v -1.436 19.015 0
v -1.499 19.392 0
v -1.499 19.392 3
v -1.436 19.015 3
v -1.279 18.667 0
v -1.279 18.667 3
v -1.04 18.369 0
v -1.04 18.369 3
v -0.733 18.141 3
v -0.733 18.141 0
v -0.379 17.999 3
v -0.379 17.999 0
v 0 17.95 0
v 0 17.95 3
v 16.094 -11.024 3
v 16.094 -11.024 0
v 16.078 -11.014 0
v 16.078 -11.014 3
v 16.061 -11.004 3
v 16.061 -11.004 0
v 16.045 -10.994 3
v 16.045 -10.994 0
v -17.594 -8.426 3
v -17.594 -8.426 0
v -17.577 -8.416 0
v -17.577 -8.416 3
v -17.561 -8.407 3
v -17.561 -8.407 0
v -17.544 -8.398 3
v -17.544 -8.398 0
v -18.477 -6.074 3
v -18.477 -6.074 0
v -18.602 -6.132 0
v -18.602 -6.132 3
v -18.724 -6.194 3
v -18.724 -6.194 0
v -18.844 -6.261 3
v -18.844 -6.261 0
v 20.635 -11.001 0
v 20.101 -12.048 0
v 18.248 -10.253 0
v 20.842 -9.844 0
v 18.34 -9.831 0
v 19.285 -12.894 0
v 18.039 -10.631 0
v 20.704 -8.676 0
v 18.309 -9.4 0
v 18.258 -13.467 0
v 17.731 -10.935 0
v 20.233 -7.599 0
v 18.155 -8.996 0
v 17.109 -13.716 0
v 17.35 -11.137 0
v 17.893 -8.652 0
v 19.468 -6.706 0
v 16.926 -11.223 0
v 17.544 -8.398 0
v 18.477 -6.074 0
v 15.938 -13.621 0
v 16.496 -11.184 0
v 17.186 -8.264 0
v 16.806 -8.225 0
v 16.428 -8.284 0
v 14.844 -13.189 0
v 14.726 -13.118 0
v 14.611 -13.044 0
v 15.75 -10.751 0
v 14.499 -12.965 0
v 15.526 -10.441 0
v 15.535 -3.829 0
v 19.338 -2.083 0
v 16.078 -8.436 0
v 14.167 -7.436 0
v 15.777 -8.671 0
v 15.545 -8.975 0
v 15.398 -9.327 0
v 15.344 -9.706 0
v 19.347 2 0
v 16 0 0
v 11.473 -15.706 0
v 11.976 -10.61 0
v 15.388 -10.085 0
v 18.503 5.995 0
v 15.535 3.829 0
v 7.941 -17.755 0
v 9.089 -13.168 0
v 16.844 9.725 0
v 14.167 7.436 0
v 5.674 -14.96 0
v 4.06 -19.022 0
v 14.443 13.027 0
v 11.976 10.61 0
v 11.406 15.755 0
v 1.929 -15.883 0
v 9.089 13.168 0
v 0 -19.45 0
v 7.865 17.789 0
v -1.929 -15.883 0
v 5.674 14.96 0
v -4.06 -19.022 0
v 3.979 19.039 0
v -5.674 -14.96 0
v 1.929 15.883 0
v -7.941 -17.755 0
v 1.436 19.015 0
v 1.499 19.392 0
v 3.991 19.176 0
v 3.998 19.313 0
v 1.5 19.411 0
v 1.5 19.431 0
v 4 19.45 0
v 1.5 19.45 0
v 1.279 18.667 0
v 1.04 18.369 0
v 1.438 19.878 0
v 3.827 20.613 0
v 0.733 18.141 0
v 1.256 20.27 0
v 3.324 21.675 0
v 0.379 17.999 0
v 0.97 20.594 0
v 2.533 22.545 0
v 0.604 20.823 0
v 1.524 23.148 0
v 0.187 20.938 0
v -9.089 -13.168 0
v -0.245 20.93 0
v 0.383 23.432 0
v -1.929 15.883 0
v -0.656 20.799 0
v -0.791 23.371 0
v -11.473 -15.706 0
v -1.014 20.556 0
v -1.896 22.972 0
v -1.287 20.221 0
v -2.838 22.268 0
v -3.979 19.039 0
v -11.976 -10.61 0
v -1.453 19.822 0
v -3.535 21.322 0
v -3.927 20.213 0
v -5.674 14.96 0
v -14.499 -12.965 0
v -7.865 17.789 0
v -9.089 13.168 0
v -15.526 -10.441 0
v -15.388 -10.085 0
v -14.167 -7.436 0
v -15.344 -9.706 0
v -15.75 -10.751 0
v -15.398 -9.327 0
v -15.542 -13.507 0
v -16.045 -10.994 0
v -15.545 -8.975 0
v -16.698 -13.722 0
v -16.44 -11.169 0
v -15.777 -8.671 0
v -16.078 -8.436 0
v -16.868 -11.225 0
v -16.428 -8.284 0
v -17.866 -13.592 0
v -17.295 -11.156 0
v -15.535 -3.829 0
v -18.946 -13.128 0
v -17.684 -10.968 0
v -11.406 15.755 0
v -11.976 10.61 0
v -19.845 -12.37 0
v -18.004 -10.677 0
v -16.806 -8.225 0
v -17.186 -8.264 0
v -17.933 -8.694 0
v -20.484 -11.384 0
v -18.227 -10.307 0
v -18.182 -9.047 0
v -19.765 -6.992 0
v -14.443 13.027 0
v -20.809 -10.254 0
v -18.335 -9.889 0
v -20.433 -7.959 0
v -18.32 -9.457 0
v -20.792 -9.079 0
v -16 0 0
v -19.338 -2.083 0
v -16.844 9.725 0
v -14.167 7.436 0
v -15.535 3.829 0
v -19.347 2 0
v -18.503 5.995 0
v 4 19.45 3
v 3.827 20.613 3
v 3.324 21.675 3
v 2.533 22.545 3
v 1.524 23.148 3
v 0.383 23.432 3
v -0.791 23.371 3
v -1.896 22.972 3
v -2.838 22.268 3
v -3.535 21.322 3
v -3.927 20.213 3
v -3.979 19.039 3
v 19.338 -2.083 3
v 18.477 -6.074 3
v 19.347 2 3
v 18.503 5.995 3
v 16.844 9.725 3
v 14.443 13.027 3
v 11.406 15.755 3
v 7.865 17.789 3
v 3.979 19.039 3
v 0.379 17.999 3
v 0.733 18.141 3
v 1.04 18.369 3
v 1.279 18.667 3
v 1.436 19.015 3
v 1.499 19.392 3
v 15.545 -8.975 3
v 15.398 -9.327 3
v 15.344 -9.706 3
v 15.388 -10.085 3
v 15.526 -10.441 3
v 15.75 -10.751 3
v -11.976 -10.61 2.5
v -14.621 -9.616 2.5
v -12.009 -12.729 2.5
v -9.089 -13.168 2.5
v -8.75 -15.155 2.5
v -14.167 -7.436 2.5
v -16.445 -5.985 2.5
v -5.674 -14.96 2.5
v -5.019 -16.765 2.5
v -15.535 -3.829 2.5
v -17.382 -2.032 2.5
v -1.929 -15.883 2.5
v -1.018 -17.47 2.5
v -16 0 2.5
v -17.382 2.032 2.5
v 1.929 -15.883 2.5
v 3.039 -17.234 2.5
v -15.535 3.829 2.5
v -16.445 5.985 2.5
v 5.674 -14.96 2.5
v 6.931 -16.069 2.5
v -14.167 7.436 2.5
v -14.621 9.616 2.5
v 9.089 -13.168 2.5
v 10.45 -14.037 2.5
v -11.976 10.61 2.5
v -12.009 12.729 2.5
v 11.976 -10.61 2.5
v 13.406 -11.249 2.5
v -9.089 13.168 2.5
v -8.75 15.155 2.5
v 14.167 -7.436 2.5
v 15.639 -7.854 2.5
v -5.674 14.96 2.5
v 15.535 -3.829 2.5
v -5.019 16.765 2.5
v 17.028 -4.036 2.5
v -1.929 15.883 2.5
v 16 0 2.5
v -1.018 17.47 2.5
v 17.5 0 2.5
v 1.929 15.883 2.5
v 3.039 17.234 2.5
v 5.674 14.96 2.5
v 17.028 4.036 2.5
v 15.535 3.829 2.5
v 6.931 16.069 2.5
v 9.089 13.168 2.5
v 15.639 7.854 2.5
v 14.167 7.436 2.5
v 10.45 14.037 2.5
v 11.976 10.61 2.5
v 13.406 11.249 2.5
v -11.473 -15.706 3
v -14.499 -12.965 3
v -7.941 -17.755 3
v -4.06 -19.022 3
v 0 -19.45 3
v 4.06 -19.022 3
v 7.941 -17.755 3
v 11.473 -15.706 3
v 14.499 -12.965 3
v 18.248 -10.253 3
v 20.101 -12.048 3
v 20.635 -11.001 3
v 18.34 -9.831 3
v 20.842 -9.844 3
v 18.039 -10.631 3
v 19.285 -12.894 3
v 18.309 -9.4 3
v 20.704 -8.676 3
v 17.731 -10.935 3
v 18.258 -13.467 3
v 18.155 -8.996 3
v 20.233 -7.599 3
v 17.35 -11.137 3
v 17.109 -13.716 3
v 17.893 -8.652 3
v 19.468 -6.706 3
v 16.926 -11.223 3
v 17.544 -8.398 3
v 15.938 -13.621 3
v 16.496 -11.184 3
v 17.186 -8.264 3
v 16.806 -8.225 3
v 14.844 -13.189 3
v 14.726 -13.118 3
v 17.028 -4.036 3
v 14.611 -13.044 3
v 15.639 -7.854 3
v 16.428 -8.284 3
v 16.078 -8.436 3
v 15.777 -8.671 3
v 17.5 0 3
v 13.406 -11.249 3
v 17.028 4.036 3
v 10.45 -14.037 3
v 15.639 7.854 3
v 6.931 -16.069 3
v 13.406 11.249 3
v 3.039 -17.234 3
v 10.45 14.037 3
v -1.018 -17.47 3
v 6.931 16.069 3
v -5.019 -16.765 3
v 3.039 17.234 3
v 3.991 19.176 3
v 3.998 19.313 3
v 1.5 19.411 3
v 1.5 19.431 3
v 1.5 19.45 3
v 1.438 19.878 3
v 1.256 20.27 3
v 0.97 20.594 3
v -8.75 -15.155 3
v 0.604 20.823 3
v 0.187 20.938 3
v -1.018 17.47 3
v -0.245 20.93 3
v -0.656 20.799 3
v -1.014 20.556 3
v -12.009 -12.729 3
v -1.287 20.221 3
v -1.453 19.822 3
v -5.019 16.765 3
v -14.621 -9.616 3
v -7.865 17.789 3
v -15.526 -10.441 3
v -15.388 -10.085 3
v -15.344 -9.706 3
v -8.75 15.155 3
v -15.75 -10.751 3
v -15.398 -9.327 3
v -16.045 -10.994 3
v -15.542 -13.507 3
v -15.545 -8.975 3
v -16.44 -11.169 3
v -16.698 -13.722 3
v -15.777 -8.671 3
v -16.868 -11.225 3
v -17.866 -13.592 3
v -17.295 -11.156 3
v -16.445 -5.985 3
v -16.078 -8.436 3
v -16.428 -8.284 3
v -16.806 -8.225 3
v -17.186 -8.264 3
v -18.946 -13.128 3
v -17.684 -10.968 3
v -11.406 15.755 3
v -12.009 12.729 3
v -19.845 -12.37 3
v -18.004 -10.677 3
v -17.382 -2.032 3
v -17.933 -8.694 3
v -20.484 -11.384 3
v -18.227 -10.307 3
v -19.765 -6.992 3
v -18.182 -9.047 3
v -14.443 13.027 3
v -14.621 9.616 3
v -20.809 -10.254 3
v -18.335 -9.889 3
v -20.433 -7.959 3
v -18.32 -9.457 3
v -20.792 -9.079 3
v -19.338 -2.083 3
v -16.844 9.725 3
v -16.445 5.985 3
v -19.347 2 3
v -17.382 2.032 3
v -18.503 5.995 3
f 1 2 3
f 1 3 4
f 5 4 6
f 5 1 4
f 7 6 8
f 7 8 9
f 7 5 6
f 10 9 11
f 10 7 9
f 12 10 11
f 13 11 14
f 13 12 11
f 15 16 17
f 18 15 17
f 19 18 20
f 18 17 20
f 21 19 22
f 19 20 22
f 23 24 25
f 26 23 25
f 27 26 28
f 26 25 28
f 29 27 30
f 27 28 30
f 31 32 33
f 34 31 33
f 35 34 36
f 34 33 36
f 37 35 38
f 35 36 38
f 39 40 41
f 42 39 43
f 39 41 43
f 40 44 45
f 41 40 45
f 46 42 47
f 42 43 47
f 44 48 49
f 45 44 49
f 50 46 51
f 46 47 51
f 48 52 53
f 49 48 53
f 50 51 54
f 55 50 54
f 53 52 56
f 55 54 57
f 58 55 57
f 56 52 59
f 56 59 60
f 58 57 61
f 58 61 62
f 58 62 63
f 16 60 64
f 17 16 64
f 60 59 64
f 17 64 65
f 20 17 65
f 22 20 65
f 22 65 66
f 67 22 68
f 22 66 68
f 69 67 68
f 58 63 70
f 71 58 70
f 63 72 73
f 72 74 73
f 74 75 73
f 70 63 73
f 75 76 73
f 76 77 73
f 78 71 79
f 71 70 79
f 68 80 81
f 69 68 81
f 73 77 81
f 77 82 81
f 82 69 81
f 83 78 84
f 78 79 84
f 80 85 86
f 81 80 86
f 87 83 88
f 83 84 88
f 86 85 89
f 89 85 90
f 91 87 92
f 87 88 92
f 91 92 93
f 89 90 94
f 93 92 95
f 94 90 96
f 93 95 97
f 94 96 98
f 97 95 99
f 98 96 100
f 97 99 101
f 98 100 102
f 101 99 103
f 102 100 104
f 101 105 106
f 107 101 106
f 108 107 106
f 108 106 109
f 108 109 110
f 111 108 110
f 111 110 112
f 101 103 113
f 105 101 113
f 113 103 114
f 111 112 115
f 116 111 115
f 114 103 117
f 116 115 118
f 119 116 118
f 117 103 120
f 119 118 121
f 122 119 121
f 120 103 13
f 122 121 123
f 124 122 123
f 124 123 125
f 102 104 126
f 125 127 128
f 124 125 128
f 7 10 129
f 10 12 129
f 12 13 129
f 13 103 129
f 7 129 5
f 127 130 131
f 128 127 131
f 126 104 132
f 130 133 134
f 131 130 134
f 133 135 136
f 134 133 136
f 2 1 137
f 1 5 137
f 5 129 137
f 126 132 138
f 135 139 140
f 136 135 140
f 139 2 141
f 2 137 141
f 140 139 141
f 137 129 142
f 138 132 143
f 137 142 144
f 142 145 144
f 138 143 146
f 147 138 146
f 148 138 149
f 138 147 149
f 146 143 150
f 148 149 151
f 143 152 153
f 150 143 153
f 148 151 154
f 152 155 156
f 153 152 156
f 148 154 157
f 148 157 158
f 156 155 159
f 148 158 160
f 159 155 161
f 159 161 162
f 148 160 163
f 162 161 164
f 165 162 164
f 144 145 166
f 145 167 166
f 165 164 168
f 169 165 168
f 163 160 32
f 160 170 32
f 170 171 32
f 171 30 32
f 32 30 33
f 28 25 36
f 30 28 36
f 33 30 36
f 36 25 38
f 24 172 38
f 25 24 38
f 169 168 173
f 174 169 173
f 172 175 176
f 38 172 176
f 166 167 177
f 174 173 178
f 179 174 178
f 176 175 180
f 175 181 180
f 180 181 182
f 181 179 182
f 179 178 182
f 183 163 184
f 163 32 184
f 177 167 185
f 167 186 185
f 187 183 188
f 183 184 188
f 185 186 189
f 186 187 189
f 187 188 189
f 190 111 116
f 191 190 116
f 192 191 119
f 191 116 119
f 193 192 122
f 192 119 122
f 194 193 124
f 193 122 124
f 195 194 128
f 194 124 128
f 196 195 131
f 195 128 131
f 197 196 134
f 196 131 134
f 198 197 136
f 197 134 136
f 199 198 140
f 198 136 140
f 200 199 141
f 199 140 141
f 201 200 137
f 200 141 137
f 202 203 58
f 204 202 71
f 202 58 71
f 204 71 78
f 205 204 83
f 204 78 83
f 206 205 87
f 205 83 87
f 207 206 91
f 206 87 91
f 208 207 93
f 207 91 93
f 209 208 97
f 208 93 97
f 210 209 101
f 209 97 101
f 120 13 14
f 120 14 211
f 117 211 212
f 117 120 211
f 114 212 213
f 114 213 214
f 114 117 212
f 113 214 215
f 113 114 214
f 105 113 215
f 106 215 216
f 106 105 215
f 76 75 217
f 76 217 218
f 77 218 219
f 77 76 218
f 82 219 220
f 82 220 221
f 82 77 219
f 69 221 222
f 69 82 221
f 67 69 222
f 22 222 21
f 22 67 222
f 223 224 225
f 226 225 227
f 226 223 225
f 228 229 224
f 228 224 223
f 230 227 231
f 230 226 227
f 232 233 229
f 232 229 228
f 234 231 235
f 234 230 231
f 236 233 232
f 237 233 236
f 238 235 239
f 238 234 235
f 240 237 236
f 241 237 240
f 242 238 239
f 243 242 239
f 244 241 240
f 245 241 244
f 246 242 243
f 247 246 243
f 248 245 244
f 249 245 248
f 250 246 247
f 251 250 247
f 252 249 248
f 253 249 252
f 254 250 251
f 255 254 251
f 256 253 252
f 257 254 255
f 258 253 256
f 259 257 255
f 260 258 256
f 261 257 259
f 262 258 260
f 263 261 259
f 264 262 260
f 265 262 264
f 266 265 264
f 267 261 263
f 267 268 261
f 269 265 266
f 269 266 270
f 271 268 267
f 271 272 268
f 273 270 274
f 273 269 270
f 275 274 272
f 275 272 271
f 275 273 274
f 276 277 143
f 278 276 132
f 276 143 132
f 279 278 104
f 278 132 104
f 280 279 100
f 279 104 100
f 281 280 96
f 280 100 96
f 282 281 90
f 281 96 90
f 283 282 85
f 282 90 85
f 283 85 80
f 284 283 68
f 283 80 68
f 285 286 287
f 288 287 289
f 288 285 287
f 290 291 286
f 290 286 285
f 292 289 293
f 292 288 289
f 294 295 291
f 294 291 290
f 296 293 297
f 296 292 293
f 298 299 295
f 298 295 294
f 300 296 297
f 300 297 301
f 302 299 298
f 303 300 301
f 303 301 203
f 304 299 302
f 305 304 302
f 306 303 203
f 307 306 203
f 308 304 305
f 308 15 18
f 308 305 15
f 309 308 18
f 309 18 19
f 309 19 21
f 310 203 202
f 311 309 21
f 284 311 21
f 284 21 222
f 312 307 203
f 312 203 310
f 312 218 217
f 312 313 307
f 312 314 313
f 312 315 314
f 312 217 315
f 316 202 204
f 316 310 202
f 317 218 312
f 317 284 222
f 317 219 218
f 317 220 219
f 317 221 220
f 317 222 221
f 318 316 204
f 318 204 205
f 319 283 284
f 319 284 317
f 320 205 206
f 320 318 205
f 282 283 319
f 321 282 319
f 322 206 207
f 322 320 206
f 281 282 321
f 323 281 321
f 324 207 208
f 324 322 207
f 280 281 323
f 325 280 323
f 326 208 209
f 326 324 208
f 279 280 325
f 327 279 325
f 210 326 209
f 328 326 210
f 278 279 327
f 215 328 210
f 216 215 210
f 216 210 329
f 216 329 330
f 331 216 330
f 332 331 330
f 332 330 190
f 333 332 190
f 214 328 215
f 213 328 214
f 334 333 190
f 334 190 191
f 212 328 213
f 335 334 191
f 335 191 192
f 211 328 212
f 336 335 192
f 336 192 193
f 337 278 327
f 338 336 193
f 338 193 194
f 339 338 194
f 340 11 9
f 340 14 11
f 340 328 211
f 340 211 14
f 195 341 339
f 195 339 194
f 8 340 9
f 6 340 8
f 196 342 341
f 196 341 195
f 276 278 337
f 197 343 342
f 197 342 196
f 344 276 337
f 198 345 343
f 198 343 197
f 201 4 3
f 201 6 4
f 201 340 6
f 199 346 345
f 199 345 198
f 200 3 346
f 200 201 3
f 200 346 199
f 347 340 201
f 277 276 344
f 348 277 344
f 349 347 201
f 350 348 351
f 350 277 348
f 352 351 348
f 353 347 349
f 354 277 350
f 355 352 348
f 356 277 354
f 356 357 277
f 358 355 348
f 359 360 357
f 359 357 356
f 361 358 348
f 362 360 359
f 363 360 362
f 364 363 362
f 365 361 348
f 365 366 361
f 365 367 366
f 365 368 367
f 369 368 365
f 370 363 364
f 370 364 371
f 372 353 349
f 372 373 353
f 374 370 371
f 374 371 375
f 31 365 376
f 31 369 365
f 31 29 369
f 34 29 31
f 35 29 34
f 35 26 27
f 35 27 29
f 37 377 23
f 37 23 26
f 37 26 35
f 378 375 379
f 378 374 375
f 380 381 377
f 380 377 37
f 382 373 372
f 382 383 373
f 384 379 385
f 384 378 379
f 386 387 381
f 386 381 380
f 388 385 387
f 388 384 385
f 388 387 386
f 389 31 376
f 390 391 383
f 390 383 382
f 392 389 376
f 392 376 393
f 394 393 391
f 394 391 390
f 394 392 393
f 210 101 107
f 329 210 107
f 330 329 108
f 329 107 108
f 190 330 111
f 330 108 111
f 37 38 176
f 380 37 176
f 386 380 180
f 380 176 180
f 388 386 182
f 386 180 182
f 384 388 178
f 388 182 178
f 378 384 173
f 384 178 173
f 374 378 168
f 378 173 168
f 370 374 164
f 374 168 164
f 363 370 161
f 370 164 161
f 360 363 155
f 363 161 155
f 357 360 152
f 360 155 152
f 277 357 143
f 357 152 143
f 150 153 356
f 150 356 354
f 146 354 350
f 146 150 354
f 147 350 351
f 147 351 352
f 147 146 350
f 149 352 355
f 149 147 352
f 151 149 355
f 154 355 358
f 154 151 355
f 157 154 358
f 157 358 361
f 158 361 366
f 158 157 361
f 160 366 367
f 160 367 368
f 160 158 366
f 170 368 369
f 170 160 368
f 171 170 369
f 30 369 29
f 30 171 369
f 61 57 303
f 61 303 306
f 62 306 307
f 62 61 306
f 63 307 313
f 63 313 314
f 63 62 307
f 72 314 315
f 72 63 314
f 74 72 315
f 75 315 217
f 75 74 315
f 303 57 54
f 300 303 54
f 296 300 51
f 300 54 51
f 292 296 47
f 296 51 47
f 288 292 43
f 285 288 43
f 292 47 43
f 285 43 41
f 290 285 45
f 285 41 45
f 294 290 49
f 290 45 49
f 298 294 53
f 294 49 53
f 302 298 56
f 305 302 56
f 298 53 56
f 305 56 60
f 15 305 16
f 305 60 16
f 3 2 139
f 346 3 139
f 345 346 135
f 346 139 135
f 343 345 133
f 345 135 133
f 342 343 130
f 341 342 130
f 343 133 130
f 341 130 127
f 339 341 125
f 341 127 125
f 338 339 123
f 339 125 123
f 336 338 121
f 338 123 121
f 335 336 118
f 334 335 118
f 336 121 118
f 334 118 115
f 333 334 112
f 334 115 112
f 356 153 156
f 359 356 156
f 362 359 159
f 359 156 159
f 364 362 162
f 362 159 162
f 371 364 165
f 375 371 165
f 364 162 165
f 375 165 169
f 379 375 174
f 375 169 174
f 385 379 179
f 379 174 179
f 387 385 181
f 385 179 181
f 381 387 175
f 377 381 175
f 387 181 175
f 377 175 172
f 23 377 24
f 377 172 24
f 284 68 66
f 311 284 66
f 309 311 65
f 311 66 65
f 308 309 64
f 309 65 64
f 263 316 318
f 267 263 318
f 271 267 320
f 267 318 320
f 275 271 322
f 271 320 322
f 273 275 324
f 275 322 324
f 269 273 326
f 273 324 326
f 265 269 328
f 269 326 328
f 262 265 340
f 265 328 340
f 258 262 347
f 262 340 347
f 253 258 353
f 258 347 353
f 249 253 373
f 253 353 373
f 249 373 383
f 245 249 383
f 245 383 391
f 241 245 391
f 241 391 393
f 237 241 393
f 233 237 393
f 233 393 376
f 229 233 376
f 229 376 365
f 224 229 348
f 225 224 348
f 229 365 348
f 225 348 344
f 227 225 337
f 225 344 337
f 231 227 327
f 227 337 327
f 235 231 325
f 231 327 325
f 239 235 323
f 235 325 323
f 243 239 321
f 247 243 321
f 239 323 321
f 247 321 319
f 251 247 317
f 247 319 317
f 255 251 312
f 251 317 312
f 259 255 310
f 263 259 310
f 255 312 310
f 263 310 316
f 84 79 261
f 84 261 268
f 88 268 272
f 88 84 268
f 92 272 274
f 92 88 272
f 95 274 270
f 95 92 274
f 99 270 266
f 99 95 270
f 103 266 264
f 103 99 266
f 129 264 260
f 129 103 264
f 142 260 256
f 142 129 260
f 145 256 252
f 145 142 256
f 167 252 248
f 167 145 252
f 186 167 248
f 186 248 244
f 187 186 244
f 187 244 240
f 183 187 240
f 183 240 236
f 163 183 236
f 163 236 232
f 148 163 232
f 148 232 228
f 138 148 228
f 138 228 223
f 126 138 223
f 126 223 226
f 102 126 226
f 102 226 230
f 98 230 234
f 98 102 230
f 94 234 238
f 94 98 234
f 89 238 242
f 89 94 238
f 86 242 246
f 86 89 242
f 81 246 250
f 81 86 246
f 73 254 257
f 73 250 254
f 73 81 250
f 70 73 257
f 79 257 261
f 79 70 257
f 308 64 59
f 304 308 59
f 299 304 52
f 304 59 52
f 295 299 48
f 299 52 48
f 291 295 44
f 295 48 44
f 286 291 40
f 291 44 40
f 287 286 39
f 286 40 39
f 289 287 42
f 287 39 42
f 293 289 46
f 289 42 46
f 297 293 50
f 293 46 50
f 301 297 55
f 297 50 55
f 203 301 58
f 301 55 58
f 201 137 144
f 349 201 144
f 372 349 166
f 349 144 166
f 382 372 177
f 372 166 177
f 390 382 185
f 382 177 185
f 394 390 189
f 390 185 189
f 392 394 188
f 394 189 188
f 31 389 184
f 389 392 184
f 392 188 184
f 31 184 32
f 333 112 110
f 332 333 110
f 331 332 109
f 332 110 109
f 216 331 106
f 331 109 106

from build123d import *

# Parameters (mm, degrees)
ESQUISSE1_R                                = 19.45
ESQUISSE1_R_2                              = 16
BOSS_EXTRU_1_DEPTH                         = 3
ENL_V_MAT_EXTRU_1_DEPTH                    = 3
BOSS_EXTRU_2_DEPTH                         = 3
R_P_TITION_CIRCULAIRE1_COUNT               = 2
R_P_TITION_CIRCULAIRE1_ANGLE               = 120
R_P_TITION_CIRCULAIRE1_THE_OTHER_WAY_COUNT = 2
R_P_TITION_CIRCULAIRE1_THE_OTHER_WAY_ANGLE = 120
ESQUISSE2_R                                = 17.5
ENL_V_MAT_EXTRU_2_DEPTH                    = 0.5


with BuildPart() as part:
    # Esquisse1 → Boss.-Extru.1 (new body)
    with BuildSketch(Plane.XY):
        Circle(ESQUISSE1_R)
        Circle(ESQUISSE1_R_2, mode=Mode.SUBTRACT)
    extrude(amount=BOSS_EXTRU_1_DEPTH)

    # Esquisse1<12> → Enlèv. mat.-Extru.1 (cut)
    with BuildSketch(Plane.XY):
        with BuildLine():
            ThreePointArc((-1.498884406, 19.392159383), (-1.040009393, 18.369083508), (0, 17.95))
            Line((0, 17.95), (0, 19.45))
            ThreePointArc((0, 19.45), (-0.75, 19.435534467), (-1.498884406, 19.392159383))
        make_face()
        with BuildLine():
            Line((0, 19.45), (0, 17.95))
            ThreePointArc((0, 17.95), (1.040009393, 18.369083508), (1.498884406, 19.392159383))
            ThreePointArc((1.498884406, 19.392159383), (0.75, 19.435534467), (0, 19.45))
        make_face()
    enl_v_mat_extru_1 = extrude(amount=ENL_V_MAT_EXTRU_1_DEPTH, mode=Mode.SUBTRACT)

    # Esquisse1<13> → Boss.-Extru.2 (add)
    with BuildSketch(Plane.XY):
        with BuildLine():
            ThreePointArc((-1.498884406, 19.392159383), (-0.028925687, 20.949721076), (1.5, 19.45))
            ThreePointArc((1.5, 19.45), (1.499721076, 19.421074313), (1.498884406, 19.392159383))
            ThreePointArc((1.498884406, 19.392159383), (2.744536924, 19.255389299), (3.978796705, 19.038688946))
            ThreePointArc((3.978796705, 19.038688946), (3.994695659, 19.244071394), (4, 19.45))
            ThreePointArc((4, 19.45), (-0.205928606, 23.444695659), (-3.978796705, 19.038688946))
            ThreePointArc((-3.978796705, 19.038688946), (-2.744536924, 19.255389299), (-1.498884406, 19.392159383))
        make_face()
    boss_extru_2 = extrude(amount=BOSS_EXTRU_2_DEPTH)

    # Répétition circulaire1: Enlèv. mat.-Extru.1, Boss.-Extru.2 ×2 about axis
    r_p_tition_circulaire1_axis = Axis((0, 0, 3), (0, 0, -1))
    add([enl_v_mat_extru_1.rotate(r_p_tition_circulaire1_axis, i * R_P_TITION_CIRCULAIRE1_ANGLE / (R_P_TITION_CIRCULAIRE1_COUNT - 1)) for i in range(1, R_P_TITION_CIRCULAIRE1_COUNT)], mode=Mode.SUBTRACT)
    add([boss_extru_2.rotate(r_p_tition_circulaire1_axis, i * R_P_TITION_CIRCULAIRE1_ANGLE / (R_P_TITION_CIRCULAIRE1_COUNT - 1)) for i in range(1, R_P_TITION_CIRCULAIRE1_COUNT)])

    # Répétition circulaire1 the other way: Enlèv. mat.-Extru.1, Boss.-Extru.2 ×2 about axis
    r_p_tition_circulaire1_the_other_way_axis = Axis((0, 0, 3), (0, 0, 1))
    add([enl_v_mat_extru_1.rotate(r_p_tition_circulaire1_the_other_way_axis, i * R_P_TITION_CIRCULAIRE1_THE_OTHER_WAY_ANGLE / (R_P_TITION_CIRCULAIRE1_THE_OTHER_WAY_COUNT - 1)) for i in range(1, R_P_TITION_CIRCULAIRE1_THE_OTHER_WAY_COUNT)], mode=Mode.SUBTRACT)
    add([boss_extru_2.rotate(r_p_tition_circulaire1_the_other_way_axis, i * R_P_TITION_CIRCULAIRE1_THE_OTHER_WAY_ANGLE / (R_P_TITION_CIRCULAIRE1_THE_OTHER_WAY_COUNT - 1)) for i in range(1, R_P_TITION_CIRCULAIRE1_THE_OTHER_WAY_COUNT)])

    # Esquisse2 → Enlèv. mat.-Extru.2 (cut)
    with BuildSketch(Plane.XY.offset(3)):
        Circle(ESQUISSE2_R)
    extrude(amount=-ENL_V_MAT_EXTRU_2_DEPTH, mode=Mode.SUBTRACT)


solid = part.part
